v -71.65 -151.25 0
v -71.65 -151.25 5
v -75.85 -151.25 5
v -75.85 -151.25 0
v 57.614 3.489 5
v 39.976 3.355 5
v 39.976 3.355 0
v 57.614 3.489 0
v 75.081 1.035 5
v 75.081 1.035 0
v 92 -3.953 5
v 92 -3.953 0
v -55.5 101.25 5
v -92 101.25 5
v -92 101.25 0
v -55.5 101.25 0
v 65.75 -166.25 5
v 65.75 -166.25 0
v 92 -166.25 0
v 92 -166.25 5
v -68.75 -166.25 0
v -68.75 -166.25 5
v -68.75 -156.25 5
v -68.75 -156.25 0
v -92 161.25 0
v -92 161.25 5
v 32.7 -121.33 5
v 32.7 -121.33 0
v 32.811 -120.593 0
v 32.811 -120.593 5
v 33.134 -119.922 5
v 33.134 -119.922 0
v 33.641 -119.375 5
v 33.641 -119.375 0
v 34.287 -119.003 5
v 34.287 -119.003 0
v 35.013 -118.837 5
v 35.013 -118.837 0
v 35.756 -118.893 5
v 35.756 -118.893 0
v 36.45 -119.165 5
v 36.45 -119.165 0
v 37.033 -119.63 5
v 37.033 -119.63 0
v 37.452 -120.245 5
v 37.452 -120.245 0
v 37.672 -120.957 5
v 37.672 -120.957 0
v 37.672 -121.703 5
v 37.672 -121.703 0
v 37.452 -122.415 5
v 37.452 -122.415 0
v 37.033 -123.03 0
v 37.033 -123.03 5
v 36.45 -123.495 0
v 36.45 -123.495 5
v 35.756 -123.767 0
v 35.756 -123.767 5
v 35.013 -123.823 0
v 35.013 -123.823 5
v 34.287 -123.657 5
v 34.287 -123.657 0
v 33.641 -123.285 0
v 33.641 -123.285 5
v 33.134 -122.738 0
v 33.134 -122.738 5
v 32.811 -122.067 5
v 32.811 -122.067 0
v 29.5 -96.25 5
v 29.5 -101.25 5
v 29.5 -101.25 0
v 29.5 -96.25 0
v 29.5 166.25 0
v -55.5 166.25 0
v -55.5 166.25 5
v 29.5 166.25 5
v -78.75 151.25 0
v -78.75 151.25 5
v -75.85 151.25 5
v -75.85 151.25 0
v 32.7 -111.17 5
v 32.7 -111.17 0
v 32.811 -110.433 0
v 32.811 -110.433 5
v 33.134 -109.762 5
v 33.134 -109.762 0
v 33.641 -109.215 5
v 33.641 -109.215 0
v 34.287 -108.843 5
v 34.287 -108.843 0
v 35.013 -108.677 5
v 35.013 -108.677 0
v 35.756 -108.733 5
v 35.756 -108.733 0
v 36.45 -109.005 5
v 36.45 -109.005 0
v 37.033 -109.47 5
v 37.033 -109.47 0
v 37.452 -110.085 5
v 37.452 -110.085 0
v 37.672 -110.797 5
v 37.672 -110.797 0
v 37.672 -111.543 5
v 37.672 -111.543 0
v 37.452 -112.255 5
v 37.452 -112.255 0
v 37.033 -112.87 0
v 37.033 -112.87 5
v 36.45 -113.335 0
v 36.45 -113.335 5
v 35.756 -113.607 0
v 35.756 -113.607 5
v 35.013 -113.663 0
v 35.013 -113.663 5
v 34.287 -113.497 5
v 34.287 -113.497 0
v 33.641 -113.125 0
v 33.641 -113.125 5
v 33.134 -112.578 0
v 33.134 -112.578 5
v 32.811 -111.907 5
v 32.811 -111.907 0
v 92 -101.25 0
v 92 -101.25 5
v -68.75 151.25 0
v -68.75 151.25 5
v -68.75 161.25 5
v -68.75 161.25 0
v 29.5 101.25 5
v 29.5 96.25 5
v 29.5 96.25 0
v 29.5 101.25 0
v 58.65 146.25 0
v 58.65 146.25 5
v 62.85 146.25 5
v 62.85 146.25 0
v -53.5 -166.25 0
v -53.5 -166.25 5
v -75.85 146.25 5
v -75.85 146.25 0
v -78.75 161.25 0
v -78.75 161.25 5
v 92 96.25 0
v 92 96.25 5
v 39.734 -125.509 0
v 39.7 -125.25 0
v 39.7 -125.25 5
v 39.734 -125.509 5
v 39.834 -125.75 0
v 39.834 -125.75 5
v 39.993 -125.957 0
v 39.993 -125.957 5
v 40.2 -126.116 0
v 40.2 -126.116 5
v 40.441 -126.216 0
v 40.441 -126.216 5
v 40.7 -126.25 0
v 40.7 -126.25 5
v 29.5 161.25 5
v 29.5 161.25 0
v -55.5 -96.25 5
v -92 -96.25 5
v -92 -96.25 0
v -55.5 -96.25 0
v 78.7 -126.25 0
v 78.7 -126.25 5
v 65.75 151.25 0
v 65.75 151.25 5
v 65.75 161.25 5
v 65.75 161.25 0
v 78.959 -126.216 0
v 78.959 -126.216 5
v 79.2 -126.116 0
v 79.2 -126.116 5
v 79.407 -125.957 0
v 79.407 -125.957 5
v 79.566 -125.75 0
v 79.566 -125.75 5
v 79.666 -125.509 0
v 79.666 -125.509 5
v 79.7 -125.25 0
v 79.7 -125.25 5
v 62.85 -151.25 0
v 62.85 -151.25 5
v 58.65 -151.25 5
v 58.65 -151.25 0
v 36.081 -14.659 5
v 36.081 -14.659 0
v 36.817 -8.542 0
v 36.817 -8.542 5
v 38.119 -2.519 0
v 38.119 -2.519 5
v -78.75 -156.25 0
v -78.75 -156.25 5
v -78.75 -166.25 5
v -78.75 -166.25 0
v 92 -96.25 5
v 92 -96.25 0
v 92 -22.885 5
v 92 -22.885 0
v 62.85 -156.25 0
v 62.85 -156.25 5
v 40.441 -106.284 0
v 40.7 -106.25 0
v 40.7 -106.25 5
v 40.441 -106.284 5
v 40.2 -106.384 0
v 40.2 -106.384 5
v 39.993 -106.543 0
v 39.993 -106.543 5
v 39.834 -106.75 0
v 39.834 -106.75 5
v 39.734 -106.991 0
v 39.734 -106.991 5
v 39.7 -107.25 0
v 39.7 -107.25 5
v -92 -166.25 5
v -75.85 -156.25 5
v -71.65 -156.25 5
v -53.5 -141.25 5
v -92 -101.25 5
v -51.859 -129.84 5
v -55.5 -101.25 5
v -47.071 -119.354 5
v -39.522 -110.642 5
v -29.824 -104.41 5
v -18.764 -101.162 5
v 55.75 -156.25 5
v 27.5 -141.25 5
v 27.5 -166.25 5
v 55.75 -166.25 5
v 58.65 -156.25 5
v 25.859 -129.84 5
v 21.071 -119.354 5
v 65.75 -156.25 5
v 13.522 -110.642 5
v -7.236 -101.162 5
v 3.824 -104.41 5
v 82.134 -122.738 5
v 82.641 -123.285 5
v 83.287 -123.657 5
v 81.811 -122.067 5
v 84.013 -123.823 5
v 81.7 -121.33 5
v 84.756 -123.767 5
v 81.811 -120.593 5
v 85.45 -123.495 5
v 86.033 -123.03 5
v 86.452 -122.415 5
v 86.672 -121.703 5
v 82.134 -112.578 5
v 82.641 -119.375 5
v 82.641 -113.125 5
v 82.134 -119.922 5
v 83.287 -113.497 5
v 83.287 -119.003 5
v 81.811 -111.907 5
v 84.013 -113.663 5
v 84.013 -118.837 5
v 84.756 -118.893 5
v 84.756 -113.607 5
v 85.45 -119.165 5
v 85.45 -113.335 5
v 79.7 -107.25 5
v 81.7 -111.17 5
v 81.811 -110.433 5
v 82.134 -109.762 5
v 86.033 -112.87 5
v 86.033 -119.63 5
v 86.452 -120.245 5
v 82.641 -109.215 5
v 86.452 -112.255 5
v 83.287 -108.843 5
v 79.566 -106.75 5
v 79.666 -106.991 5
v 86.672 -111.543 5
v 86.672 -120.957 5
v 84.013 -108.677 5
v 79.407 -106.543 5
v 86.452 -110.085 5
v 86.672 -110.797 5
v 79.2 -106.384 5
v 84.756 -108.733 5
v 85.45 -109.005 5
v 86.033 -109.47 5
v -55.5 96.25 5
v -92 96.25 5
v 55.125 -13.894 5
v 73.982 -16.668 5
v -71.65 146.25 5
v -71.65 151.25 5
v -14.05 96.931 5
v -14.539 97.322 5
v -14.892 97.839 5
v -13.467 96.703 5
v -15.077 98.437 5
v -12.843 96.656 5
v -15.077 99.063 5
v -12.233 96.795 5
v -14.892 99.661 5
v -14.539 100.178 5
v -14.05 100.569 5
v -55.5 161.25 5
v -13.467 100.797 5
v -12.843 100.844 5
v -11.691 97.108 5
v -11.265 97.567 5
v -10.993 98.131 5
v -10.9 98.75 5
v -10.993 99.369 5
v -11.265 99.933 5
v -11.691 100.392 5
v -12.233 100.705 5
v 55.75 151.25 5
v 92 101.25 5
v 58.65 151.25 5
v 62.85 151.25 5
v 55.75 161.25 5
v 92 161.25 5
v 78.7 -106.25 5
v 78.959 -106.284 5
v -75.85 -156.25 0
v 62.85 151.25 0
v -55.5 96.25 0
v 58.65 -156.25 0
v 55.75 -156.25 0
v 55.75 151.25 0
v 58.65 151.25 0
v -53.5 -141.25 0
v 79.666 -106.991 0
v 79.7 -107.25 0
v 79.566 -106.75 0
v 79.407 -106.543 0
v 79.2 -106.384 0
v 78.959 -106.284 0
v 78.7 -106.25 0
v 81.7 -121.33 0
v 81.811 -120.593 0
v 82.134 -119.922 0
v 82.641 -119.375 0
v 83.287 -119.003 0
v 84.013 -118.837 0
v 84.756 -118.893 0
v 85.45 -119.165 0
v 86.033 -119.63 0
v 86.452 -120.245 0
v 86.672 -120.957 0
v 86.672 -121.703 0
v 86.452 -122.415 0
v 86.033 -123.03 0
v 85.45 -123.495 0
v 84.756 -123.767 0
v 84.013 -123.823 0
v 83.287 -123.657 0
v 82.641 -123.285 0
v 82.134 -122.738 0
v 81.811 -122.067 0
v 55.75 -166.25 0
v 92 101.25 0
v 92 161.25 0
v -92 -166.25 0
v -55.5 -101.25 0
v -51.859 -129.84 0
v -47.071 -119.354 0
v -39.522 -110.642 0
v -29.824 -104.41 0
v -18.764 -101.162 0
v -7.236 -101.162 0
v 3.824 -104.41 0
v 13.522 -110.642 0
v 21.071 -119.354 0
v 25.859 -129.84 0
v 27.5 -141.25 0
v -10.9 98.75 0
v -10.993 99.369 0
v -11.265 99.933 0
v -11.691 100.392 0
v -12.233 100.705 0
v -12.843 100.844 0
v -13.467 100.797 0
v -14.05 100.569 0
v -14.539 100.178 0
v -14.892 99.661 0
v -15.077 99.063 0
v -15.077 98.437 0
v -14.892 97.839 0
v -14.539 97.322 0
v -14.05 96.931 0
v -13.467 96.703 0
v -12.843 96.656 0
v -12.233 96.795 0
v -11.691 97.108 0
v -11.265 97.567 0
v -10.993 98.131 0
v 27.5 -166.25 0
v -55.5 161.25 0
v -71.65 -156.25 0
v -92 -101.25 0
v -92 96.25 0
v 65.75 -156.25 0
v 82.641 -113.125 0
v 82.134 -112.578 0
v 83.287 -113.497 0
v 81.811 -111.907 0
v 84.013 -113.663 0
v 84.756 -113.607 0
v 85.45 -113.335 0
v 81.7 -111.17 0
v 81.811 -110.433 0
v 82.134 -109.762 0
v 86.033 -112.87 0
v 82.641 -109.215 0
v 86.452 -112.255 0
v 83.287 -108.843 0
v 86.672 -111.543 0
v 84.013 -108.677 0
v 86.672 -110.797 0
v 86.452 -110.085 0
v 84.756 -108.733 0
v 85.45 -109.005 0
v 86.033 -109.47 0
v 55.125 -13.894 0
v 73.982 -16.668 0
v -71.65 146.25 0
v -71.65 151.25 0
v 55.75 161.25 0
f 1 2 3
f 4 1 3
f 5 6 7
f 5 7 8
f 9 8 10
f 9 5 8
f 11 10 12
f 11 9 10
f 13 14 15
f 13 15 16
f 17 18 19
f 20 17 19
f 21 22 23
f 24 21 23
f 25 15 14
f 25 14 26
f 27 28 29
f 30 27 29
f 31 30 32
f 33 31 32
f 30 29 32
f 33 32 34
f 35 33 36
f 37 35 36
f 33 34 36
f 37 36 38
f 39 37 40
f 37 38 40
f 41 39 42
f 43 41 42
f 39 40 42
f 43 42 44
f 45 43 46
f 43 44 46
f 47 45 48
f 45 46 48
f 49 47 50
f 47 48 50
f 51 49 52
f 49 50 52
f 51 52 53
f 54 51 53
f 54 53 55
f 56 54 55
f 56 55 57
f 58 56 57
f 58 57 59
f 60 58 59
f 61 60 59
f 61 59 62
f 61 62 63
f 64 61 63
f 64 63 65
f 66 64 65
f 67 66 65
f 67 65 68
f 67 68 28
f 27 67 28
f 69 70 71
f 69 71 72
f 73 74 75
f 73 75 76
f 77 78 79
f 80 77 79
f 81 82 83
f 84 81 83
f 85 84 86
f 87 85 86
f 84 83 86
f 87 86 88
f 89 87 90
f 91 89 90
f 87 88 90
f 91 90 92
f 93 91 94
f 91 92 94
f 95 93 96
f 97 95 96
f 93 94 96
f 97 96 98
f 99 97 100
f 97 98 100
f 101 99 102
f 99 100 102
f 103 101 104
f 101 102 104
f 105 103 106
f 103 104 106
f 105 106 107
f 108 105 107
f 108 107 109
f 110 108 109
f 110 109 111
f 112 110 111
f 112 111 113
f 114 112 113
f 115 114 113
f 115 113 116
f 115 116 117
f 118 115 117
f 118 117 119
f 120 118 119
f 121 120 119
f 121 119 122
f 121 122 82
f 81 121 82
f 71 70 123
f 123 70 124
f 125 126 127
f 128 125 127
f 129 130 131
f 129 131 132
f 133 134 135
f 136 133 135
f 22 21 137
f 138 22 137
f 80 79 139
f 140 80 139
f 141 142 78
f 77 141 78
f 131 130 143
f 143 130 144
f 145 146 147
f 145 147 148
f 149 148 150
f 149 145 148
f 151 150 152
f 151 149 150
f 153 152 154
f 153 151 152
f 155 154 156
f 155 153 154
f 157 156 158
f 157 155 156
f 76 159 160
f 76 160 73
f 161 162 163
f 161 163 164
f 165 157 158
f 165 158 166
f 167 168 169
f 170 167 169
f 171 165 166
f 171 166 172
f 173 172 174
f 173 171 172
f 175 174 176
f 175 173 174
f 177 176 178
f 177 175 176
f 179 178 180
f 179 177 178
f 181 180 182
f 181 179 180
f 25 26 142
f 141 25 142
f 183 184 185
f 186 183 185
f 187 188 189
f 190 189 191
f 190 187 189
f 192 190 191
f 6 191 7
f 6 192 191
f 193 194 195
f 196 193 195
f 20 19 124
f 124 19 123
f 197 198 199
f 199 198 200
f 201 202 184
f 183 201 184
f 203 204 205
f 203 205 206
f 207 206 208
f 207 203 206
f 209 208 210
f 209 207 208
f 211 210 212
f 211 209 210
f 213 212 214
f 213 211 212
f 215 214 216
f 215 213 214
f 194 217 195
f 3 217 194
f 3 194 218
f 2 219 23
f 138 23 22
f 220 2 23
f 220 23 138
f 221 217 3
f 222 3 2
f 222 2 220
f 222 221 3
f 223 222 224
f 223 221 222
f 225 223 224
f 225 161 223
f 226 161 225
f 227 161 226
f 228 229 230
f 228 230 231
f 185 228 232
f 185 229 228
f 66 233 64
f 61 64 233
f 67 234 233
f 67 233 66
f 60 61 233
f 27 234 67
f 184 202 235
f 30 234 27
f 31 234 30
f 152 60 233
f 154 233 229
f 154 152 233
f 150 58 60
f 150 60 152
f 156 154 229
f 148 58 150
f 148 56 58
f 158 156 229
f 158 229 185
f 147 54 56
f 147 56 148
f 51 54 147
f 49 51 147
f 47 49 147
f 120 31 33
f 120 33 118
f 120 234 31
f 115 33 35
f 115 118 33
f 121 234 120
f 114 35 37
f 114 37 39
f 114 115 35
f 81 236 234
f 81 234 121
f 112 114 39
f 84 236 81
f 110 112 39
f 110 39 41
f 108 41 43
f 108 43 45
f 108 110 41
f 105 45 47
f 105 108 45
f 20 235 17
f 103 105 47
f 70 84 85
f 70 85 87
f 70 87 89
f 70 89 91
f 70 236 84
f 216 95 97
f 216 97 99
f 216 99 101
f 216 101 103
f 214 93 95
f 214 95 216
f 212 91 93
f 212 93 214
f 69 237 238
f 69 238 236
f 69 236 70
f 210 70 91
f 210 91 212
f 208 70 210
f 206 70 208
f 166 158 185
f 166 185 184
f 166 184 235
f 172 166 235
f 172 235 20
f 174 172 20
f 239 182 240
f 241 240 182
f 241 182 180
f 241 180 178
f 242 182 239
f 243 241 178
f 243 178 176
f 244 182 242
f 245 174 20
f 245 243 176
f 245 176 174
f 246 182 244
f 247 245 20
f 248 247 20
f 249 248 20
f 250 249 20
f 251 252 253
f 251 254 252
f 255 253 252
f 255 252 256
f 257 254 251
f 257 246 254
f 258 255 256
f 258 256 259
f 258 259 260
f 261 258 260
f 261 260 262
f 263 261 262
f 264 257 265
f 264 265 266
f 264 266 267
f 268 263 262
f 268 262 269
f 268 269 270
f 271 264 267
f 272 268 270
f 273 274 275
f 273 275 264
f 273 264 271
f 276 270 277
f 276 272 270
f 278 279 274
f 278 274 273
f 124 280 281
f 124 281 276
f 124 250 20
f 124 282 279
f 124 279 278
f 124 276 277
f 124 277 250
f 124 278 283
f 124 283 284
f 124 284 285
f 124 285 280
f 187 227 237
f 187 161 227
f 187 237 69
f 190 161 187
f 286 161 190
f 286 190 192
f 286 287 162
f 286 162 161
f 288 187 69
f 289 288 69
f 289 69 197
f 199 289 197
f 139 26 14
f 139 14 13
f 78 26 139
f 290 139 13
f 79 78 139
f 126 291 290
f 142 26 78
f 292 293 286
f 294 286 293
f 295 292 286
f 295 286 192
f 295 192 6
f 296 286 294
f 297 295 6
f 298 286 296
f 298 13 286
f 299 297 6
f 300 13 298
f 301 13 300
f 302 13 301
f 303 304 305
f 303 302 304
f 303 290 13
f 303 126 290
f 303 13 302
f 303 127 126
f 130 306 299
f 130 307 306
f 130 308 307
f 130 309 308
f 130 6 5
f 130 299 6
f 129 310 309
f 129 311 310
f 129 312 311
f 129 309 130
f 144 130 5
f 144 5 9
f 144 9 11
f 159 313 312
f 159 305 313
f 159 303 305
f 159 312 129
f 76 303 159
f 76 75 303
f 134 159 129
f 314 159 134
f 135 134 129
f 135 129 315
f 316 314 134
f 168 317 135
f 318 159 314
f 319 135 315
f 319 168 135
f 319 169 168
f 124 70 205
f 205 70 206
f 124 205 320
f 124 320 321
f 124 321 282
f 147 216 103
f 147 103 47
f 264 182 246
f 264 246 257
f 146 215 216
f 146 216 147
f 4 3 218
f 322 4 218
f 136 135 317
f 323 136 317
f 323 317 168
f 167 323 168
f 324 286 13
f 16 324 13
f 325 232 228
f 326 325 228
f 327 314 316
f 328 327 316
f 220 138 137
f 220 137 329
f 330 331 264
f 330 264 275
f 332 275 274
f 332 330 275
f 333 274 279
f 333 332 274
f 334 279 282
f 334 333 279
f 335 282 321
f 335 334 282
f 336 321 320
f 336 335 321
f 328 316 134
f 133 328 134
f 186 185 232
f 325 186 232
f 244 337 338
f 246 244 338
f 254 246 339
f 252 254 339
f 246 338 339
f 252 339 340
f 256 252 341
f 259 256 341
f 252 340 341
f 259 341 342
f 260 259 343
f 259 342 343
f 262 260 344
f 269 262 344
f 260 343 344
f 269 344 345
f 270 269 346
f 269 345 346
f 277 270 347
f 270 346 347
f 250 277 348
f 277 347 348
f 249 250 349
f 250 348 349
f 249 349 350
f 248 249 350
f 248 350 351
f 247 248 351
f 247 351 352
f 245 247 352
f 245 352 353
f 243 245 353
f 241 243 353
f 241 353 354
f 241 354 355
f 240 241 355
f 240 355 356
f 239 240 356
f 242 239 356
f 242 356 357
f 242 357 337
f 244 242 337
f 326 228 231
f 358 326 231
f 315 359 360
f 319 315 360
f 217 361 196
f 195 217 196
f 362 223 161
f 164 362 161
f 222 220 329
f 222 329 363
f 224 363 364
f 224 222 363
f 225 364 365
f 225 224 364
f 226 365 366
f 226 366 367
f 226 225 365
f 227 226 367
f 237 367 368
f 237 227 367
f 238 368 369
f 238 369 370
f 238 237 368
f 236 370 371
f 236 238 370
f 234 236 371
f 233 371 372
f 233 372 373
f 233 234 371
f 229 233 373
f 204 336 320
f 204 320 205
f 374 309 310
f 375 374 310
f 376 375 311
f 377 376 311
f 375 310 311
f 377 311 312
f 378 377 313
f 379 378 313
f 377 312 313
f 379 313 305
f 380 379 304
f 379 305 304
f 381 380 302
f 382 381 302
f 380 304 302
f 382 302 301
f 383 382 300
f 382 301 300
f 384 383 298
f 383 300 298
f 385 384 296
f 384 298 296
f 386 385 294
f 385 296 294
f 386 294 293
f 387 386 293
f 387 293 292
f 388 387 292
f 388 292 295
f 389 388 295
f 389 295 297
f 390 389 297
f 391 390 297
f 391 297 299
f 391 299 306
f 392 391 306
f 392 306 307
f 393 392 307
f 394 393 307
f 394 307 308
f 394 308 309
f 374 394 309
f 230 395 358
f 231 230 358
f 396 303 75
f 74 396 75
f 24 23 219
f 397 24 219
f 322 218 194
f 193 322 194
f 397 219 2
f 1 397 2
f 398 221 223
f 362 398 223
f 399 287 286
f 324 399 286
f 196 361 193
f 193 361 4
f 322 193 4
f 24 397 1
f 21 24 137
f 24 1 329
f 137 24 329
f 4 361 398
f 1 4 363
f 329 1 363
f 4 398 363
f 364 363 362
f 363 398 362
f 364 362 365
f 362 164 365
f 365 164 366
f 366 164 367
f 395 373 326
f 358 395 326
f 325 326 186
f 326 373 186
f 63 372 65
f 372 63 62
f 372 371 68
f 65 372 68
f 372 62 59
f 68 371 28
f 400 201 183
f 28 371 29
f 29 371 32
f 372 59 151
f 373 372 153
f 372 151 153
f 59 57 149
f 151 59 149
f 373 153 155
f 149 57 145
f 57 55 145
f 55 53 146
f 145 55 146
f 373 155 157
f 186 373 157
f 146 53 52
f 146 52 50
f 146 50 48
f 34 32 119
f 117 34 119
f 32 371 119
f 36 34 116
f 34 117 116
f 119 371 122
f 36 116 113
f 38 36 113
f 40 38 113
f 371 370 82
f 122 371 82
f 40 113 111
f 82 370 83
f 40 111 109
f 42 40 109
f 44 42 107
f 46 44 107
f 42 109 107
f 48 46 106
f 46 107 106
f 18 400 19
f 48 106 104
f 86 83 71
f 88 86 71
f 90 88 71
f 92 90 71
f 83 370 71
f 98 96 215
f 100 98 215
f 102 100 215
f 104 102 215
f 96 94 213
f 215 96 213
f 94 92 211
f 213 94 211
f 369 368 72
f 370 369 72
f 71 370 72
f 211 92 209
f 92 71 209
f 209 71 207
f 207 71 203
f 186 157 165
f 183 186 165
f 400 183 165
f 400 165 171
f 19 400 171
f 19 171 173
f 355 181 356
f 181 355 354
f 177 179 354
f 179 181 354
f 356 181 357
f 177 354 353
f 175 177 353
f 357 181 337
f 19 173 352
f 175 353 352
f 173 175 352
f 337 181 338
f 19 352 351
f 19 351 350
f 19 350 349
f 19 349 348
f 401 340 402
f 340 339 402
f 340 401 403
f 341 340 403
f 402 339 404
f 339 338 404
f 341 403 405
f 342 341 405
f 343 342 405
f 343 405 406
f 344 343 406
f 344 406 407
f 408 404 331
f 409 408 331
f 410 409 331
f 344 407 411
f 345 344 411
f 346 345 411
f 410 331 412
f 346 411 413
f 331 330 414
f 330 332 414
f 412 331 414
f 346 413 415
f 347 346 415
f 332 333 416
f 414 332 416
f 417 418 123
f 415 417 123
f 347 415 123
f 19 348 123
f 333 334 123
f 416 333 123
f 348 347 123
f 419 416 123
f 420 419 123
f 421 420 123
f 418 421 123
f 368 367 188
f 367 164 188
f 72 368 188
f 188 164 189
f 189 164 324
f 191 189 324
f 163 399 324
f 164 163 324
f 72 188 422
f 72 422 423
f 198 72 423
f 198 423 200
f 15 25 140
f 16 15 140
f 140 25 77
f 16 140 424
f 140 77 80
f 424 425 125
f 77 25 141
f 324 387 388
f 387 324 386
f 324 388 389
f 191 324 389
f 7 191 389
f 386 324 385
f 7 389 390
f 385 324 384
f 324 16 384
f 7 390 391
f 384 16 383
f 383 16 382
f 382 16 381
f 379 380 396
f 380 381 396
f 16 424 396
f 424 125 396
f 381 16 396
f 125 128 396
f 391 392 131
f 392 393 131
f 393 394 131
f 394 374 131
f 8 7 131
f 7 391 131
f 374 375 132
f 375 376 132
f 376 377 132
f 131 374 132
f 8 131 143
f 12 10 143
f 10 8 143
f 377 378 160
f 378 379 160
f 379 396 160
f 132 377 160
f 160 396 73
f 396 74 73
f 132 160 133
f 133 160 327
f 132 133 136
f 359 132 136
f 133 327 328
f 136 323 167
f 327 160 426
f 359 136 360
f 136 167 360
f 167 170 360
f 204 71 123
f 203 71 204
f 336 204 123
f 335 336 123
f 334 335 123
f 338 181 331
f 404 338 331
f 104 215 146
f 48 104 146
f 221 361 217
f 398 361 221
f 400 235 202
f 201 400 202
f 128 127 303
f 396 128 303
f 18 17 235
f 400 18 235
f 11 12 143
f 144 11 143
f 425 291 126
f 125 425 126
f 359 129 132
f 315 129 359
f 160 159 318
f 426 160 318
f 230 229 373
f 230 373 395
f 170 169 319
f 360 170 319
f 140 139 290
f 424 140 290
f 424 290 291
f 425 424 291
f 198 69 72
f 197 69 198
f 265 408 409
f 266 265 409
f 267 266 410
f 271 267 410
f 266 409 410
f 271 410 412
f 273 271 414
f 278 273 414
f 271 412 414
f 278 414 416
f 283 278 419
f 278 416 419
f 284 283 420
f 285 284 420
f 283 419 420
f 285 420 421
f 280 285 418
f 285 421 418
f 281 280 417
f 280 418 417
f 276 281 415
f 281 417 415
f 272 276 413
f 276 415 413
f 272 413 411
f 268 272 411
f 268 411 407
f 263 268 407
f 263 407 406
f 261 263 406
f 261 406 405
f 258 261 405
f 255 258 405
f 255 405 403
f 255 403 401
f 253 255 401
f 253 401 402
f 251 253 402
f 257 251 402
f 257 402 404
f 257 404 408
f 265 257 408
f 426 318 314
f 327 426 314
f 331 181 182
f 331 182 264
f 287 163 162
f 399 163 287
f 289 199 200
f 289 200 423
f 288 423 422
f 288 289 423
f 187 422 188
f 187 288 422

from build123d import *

# Parameters (mm, degrees)
SKETCH2_W           = 184
SKETCH2_H           = 332.5
BOSS_EXTRUDE1_DEPTH = 5
SKETCH3_W           = 36.5
SKETCH3_H           = 5
SKETCH3_W_2         = 62.5
CUT_EXTRUDE1_DEPTH  = 5
CUT_EXTRUDE2_DEPTH  = 10
SKETCH5_R           = 2.1
CUT_EXTRUDE3_DEPTH  = 10
SKETCH6_R           = 2.5
CUT_EXTRUDE4_DEPTH  = 20
CUT_EXTRUDE6_DEPTH  = 6


with BuildPart() as part:
    # Sketch2 → Boss-Extrude1 (new body)
    with BuildSketch(Plane.XY):
        Rectangle(SKETCH2_W, SKETCH2_H)
    extrude(amount=BOSS_EXTRUDE1_DEPTH)

    # Sketch3 → Cut-Extrude1 (cut)
    with BuildSketch(Plane.XY.offset(5)):
        with Locations((-73.75, -98.75)):
            Rectangle(SKETCH3_W, SKETCH3_H)
        with Locations((60.75, -98.75)):
            Rectangle(SKETCH3_W_2, SKETCH3_H)
        with Locations((-73.75, 163.75)):
            Rectangle(SKETCH3_W, SKETCH3_H)
        with Locations((60.75, 163.75)):
            Rectangle(SKETCH3_W_2, SKETCH3_H)
        with Locations((60.75, 98.75)):
            Rectangle(SKETCH3_W_2, SKETCH3_H)
        with BuildLine():
            Line((27.5, -141.25), (27.5, -166.25))
            Line((27.5, -166.25), (-53.5, -166.25))
            Line((-53.5, -166.25), (-53.5, -141.25))
            ThreePointArc((-53.5, -141.25), (-13, -100.75), (27.5, -141.25))
        make_face()
        with Locations((-73.75, 98.75)):
            Rectangle(SKETCH3_W, SKETCH3_H)
    extrude(amount=-CUT_EXTRUDE1_DEPTH, mode=Mode.SUBTRACT)

    # Sketch4 → Cut-Extrude2 (cut)
    with BuildSketch(Plane.XY.offset(5)):
        Polygon((55.75, 161.25), (55.75, 151.25), (58.65, 151.25), (58.65, 146.25), (62.85, 146.25), (62.85, 151.25), (65.75, 151.25), (65.75, 161.25), align=None)
        Polygon((-78.75, 161.25), (-78.75, 151.25), (-75.85, 151.25), (-75.85, 146.25), (-71.65, 146.25), (-71.65, 151.25), (-68.75, 151.25), (-68.75, 161.25), align=None)
        Polygon((65.75, -166.25), (65.75, -156.25), (62.85, -156.25), (62.85, -151.25), (58.65, -151.25), (58.65, -156.25), (55.75, -156.25), (55.75, -166.25), align=None)
        Polygon((-68.75, -166.25), (-68.75, -156.25), (-71.65, -156.25), (-71.65, -151.25), (-75.85, -151.25), (-75.85, -156.25), (-78.75, -156.25), (-78.75, -166.25), align=None)
    extrude(amount=-CUT_EXTRUDE2_DEPTH, mode=Mode.SUBTRACT)

    # Sketch5 → Cut-Extrude3 (cut)
    with BuildSketch(Plane.XY.offset(5)):
        with Locations((-13, 98.75)):
            Circle(SKETCH5_R)
    extrude(amount=-CUT_EXTRUDE3_DEPTH, mode=Mode.SUBTRACT)

    # Sketch6 → Cut-Extrude4 (cut)
    with BuildSketch(Plane(origin=(0, 0, 0), x_dir=(-1, 0, 0), z_dir=(0, 0, -1))):
        with Locations((-35.2, -111.17)):
            Circle(SKETCH6_R)
        with Locations((-35.2, -121.33)):
            Circle(SKETCH6_R)
        with Locations((-84.2, -111.17)):
            Circle(SKETCH6_R)
        with Locations((-84.2, -121.33)):
            Circle(SKETCH6_R)
        with BuildLine():
            Line((-78.2, -106.25), (-41.2, -106.25))
            Line((-41.2, -106.25), (-40.7, -106.25))
            ThreePointArc((-40.7, -106.25), (-39.992893219, -106.542893219), (-39.7, -107.25))
            Line((-39.7, -107.25), (-39.7, -125.25))
            ThreePointArc((-39.7, -125.25), (-39.992893219, -125.957106781), (-40.7, -126.25))
            Line((-40.7, -126.25), (-78.7, -126.25))
            ThreePointArc((-78.7, -126.25), (-79.407106781, -125.957106781), (-79.7, -125.25))
            Line((-79.7, -125.25), (-79.7, -107.25))
            ThreePointArc((-79.7, -107.25), (-79.407106781, -106.542893219), (-78.7, -106.25))
            Line((-78.7, -106.25), (-78.2, -106.25))
        make_face()
    extrude(amount=-CUT_EXTRUDE4_DEPTH, mode=Mode.SUBTRACT)

    # Sketch7 → Cut-Extrude6 (cut, through all)
    with BuildSketch(Plane.XY.offset(5)):
        with BuildLine():
            Line((92.018319465, -3.95948465), (92, -22.885338591))
            ThreePointArc((92, -22.885338591), (64.618518363, -14.841480585), (36.080546525, -14.658856257))
            ThreePointArc((36.080546525, -14.658856257), (37.397553955, -5.515336457), (39.976105832, 3.355375641))
            ThreePointArc((39.976105832, 3.355375641), (66.402572717, 2.581915177), (92.018319465, -3.95948465))
        make_face()
    extrude(amount=-CUT_EXTRUDE6_DEPTH, mode=Mode.SUBTRACT)


solid = part.part
